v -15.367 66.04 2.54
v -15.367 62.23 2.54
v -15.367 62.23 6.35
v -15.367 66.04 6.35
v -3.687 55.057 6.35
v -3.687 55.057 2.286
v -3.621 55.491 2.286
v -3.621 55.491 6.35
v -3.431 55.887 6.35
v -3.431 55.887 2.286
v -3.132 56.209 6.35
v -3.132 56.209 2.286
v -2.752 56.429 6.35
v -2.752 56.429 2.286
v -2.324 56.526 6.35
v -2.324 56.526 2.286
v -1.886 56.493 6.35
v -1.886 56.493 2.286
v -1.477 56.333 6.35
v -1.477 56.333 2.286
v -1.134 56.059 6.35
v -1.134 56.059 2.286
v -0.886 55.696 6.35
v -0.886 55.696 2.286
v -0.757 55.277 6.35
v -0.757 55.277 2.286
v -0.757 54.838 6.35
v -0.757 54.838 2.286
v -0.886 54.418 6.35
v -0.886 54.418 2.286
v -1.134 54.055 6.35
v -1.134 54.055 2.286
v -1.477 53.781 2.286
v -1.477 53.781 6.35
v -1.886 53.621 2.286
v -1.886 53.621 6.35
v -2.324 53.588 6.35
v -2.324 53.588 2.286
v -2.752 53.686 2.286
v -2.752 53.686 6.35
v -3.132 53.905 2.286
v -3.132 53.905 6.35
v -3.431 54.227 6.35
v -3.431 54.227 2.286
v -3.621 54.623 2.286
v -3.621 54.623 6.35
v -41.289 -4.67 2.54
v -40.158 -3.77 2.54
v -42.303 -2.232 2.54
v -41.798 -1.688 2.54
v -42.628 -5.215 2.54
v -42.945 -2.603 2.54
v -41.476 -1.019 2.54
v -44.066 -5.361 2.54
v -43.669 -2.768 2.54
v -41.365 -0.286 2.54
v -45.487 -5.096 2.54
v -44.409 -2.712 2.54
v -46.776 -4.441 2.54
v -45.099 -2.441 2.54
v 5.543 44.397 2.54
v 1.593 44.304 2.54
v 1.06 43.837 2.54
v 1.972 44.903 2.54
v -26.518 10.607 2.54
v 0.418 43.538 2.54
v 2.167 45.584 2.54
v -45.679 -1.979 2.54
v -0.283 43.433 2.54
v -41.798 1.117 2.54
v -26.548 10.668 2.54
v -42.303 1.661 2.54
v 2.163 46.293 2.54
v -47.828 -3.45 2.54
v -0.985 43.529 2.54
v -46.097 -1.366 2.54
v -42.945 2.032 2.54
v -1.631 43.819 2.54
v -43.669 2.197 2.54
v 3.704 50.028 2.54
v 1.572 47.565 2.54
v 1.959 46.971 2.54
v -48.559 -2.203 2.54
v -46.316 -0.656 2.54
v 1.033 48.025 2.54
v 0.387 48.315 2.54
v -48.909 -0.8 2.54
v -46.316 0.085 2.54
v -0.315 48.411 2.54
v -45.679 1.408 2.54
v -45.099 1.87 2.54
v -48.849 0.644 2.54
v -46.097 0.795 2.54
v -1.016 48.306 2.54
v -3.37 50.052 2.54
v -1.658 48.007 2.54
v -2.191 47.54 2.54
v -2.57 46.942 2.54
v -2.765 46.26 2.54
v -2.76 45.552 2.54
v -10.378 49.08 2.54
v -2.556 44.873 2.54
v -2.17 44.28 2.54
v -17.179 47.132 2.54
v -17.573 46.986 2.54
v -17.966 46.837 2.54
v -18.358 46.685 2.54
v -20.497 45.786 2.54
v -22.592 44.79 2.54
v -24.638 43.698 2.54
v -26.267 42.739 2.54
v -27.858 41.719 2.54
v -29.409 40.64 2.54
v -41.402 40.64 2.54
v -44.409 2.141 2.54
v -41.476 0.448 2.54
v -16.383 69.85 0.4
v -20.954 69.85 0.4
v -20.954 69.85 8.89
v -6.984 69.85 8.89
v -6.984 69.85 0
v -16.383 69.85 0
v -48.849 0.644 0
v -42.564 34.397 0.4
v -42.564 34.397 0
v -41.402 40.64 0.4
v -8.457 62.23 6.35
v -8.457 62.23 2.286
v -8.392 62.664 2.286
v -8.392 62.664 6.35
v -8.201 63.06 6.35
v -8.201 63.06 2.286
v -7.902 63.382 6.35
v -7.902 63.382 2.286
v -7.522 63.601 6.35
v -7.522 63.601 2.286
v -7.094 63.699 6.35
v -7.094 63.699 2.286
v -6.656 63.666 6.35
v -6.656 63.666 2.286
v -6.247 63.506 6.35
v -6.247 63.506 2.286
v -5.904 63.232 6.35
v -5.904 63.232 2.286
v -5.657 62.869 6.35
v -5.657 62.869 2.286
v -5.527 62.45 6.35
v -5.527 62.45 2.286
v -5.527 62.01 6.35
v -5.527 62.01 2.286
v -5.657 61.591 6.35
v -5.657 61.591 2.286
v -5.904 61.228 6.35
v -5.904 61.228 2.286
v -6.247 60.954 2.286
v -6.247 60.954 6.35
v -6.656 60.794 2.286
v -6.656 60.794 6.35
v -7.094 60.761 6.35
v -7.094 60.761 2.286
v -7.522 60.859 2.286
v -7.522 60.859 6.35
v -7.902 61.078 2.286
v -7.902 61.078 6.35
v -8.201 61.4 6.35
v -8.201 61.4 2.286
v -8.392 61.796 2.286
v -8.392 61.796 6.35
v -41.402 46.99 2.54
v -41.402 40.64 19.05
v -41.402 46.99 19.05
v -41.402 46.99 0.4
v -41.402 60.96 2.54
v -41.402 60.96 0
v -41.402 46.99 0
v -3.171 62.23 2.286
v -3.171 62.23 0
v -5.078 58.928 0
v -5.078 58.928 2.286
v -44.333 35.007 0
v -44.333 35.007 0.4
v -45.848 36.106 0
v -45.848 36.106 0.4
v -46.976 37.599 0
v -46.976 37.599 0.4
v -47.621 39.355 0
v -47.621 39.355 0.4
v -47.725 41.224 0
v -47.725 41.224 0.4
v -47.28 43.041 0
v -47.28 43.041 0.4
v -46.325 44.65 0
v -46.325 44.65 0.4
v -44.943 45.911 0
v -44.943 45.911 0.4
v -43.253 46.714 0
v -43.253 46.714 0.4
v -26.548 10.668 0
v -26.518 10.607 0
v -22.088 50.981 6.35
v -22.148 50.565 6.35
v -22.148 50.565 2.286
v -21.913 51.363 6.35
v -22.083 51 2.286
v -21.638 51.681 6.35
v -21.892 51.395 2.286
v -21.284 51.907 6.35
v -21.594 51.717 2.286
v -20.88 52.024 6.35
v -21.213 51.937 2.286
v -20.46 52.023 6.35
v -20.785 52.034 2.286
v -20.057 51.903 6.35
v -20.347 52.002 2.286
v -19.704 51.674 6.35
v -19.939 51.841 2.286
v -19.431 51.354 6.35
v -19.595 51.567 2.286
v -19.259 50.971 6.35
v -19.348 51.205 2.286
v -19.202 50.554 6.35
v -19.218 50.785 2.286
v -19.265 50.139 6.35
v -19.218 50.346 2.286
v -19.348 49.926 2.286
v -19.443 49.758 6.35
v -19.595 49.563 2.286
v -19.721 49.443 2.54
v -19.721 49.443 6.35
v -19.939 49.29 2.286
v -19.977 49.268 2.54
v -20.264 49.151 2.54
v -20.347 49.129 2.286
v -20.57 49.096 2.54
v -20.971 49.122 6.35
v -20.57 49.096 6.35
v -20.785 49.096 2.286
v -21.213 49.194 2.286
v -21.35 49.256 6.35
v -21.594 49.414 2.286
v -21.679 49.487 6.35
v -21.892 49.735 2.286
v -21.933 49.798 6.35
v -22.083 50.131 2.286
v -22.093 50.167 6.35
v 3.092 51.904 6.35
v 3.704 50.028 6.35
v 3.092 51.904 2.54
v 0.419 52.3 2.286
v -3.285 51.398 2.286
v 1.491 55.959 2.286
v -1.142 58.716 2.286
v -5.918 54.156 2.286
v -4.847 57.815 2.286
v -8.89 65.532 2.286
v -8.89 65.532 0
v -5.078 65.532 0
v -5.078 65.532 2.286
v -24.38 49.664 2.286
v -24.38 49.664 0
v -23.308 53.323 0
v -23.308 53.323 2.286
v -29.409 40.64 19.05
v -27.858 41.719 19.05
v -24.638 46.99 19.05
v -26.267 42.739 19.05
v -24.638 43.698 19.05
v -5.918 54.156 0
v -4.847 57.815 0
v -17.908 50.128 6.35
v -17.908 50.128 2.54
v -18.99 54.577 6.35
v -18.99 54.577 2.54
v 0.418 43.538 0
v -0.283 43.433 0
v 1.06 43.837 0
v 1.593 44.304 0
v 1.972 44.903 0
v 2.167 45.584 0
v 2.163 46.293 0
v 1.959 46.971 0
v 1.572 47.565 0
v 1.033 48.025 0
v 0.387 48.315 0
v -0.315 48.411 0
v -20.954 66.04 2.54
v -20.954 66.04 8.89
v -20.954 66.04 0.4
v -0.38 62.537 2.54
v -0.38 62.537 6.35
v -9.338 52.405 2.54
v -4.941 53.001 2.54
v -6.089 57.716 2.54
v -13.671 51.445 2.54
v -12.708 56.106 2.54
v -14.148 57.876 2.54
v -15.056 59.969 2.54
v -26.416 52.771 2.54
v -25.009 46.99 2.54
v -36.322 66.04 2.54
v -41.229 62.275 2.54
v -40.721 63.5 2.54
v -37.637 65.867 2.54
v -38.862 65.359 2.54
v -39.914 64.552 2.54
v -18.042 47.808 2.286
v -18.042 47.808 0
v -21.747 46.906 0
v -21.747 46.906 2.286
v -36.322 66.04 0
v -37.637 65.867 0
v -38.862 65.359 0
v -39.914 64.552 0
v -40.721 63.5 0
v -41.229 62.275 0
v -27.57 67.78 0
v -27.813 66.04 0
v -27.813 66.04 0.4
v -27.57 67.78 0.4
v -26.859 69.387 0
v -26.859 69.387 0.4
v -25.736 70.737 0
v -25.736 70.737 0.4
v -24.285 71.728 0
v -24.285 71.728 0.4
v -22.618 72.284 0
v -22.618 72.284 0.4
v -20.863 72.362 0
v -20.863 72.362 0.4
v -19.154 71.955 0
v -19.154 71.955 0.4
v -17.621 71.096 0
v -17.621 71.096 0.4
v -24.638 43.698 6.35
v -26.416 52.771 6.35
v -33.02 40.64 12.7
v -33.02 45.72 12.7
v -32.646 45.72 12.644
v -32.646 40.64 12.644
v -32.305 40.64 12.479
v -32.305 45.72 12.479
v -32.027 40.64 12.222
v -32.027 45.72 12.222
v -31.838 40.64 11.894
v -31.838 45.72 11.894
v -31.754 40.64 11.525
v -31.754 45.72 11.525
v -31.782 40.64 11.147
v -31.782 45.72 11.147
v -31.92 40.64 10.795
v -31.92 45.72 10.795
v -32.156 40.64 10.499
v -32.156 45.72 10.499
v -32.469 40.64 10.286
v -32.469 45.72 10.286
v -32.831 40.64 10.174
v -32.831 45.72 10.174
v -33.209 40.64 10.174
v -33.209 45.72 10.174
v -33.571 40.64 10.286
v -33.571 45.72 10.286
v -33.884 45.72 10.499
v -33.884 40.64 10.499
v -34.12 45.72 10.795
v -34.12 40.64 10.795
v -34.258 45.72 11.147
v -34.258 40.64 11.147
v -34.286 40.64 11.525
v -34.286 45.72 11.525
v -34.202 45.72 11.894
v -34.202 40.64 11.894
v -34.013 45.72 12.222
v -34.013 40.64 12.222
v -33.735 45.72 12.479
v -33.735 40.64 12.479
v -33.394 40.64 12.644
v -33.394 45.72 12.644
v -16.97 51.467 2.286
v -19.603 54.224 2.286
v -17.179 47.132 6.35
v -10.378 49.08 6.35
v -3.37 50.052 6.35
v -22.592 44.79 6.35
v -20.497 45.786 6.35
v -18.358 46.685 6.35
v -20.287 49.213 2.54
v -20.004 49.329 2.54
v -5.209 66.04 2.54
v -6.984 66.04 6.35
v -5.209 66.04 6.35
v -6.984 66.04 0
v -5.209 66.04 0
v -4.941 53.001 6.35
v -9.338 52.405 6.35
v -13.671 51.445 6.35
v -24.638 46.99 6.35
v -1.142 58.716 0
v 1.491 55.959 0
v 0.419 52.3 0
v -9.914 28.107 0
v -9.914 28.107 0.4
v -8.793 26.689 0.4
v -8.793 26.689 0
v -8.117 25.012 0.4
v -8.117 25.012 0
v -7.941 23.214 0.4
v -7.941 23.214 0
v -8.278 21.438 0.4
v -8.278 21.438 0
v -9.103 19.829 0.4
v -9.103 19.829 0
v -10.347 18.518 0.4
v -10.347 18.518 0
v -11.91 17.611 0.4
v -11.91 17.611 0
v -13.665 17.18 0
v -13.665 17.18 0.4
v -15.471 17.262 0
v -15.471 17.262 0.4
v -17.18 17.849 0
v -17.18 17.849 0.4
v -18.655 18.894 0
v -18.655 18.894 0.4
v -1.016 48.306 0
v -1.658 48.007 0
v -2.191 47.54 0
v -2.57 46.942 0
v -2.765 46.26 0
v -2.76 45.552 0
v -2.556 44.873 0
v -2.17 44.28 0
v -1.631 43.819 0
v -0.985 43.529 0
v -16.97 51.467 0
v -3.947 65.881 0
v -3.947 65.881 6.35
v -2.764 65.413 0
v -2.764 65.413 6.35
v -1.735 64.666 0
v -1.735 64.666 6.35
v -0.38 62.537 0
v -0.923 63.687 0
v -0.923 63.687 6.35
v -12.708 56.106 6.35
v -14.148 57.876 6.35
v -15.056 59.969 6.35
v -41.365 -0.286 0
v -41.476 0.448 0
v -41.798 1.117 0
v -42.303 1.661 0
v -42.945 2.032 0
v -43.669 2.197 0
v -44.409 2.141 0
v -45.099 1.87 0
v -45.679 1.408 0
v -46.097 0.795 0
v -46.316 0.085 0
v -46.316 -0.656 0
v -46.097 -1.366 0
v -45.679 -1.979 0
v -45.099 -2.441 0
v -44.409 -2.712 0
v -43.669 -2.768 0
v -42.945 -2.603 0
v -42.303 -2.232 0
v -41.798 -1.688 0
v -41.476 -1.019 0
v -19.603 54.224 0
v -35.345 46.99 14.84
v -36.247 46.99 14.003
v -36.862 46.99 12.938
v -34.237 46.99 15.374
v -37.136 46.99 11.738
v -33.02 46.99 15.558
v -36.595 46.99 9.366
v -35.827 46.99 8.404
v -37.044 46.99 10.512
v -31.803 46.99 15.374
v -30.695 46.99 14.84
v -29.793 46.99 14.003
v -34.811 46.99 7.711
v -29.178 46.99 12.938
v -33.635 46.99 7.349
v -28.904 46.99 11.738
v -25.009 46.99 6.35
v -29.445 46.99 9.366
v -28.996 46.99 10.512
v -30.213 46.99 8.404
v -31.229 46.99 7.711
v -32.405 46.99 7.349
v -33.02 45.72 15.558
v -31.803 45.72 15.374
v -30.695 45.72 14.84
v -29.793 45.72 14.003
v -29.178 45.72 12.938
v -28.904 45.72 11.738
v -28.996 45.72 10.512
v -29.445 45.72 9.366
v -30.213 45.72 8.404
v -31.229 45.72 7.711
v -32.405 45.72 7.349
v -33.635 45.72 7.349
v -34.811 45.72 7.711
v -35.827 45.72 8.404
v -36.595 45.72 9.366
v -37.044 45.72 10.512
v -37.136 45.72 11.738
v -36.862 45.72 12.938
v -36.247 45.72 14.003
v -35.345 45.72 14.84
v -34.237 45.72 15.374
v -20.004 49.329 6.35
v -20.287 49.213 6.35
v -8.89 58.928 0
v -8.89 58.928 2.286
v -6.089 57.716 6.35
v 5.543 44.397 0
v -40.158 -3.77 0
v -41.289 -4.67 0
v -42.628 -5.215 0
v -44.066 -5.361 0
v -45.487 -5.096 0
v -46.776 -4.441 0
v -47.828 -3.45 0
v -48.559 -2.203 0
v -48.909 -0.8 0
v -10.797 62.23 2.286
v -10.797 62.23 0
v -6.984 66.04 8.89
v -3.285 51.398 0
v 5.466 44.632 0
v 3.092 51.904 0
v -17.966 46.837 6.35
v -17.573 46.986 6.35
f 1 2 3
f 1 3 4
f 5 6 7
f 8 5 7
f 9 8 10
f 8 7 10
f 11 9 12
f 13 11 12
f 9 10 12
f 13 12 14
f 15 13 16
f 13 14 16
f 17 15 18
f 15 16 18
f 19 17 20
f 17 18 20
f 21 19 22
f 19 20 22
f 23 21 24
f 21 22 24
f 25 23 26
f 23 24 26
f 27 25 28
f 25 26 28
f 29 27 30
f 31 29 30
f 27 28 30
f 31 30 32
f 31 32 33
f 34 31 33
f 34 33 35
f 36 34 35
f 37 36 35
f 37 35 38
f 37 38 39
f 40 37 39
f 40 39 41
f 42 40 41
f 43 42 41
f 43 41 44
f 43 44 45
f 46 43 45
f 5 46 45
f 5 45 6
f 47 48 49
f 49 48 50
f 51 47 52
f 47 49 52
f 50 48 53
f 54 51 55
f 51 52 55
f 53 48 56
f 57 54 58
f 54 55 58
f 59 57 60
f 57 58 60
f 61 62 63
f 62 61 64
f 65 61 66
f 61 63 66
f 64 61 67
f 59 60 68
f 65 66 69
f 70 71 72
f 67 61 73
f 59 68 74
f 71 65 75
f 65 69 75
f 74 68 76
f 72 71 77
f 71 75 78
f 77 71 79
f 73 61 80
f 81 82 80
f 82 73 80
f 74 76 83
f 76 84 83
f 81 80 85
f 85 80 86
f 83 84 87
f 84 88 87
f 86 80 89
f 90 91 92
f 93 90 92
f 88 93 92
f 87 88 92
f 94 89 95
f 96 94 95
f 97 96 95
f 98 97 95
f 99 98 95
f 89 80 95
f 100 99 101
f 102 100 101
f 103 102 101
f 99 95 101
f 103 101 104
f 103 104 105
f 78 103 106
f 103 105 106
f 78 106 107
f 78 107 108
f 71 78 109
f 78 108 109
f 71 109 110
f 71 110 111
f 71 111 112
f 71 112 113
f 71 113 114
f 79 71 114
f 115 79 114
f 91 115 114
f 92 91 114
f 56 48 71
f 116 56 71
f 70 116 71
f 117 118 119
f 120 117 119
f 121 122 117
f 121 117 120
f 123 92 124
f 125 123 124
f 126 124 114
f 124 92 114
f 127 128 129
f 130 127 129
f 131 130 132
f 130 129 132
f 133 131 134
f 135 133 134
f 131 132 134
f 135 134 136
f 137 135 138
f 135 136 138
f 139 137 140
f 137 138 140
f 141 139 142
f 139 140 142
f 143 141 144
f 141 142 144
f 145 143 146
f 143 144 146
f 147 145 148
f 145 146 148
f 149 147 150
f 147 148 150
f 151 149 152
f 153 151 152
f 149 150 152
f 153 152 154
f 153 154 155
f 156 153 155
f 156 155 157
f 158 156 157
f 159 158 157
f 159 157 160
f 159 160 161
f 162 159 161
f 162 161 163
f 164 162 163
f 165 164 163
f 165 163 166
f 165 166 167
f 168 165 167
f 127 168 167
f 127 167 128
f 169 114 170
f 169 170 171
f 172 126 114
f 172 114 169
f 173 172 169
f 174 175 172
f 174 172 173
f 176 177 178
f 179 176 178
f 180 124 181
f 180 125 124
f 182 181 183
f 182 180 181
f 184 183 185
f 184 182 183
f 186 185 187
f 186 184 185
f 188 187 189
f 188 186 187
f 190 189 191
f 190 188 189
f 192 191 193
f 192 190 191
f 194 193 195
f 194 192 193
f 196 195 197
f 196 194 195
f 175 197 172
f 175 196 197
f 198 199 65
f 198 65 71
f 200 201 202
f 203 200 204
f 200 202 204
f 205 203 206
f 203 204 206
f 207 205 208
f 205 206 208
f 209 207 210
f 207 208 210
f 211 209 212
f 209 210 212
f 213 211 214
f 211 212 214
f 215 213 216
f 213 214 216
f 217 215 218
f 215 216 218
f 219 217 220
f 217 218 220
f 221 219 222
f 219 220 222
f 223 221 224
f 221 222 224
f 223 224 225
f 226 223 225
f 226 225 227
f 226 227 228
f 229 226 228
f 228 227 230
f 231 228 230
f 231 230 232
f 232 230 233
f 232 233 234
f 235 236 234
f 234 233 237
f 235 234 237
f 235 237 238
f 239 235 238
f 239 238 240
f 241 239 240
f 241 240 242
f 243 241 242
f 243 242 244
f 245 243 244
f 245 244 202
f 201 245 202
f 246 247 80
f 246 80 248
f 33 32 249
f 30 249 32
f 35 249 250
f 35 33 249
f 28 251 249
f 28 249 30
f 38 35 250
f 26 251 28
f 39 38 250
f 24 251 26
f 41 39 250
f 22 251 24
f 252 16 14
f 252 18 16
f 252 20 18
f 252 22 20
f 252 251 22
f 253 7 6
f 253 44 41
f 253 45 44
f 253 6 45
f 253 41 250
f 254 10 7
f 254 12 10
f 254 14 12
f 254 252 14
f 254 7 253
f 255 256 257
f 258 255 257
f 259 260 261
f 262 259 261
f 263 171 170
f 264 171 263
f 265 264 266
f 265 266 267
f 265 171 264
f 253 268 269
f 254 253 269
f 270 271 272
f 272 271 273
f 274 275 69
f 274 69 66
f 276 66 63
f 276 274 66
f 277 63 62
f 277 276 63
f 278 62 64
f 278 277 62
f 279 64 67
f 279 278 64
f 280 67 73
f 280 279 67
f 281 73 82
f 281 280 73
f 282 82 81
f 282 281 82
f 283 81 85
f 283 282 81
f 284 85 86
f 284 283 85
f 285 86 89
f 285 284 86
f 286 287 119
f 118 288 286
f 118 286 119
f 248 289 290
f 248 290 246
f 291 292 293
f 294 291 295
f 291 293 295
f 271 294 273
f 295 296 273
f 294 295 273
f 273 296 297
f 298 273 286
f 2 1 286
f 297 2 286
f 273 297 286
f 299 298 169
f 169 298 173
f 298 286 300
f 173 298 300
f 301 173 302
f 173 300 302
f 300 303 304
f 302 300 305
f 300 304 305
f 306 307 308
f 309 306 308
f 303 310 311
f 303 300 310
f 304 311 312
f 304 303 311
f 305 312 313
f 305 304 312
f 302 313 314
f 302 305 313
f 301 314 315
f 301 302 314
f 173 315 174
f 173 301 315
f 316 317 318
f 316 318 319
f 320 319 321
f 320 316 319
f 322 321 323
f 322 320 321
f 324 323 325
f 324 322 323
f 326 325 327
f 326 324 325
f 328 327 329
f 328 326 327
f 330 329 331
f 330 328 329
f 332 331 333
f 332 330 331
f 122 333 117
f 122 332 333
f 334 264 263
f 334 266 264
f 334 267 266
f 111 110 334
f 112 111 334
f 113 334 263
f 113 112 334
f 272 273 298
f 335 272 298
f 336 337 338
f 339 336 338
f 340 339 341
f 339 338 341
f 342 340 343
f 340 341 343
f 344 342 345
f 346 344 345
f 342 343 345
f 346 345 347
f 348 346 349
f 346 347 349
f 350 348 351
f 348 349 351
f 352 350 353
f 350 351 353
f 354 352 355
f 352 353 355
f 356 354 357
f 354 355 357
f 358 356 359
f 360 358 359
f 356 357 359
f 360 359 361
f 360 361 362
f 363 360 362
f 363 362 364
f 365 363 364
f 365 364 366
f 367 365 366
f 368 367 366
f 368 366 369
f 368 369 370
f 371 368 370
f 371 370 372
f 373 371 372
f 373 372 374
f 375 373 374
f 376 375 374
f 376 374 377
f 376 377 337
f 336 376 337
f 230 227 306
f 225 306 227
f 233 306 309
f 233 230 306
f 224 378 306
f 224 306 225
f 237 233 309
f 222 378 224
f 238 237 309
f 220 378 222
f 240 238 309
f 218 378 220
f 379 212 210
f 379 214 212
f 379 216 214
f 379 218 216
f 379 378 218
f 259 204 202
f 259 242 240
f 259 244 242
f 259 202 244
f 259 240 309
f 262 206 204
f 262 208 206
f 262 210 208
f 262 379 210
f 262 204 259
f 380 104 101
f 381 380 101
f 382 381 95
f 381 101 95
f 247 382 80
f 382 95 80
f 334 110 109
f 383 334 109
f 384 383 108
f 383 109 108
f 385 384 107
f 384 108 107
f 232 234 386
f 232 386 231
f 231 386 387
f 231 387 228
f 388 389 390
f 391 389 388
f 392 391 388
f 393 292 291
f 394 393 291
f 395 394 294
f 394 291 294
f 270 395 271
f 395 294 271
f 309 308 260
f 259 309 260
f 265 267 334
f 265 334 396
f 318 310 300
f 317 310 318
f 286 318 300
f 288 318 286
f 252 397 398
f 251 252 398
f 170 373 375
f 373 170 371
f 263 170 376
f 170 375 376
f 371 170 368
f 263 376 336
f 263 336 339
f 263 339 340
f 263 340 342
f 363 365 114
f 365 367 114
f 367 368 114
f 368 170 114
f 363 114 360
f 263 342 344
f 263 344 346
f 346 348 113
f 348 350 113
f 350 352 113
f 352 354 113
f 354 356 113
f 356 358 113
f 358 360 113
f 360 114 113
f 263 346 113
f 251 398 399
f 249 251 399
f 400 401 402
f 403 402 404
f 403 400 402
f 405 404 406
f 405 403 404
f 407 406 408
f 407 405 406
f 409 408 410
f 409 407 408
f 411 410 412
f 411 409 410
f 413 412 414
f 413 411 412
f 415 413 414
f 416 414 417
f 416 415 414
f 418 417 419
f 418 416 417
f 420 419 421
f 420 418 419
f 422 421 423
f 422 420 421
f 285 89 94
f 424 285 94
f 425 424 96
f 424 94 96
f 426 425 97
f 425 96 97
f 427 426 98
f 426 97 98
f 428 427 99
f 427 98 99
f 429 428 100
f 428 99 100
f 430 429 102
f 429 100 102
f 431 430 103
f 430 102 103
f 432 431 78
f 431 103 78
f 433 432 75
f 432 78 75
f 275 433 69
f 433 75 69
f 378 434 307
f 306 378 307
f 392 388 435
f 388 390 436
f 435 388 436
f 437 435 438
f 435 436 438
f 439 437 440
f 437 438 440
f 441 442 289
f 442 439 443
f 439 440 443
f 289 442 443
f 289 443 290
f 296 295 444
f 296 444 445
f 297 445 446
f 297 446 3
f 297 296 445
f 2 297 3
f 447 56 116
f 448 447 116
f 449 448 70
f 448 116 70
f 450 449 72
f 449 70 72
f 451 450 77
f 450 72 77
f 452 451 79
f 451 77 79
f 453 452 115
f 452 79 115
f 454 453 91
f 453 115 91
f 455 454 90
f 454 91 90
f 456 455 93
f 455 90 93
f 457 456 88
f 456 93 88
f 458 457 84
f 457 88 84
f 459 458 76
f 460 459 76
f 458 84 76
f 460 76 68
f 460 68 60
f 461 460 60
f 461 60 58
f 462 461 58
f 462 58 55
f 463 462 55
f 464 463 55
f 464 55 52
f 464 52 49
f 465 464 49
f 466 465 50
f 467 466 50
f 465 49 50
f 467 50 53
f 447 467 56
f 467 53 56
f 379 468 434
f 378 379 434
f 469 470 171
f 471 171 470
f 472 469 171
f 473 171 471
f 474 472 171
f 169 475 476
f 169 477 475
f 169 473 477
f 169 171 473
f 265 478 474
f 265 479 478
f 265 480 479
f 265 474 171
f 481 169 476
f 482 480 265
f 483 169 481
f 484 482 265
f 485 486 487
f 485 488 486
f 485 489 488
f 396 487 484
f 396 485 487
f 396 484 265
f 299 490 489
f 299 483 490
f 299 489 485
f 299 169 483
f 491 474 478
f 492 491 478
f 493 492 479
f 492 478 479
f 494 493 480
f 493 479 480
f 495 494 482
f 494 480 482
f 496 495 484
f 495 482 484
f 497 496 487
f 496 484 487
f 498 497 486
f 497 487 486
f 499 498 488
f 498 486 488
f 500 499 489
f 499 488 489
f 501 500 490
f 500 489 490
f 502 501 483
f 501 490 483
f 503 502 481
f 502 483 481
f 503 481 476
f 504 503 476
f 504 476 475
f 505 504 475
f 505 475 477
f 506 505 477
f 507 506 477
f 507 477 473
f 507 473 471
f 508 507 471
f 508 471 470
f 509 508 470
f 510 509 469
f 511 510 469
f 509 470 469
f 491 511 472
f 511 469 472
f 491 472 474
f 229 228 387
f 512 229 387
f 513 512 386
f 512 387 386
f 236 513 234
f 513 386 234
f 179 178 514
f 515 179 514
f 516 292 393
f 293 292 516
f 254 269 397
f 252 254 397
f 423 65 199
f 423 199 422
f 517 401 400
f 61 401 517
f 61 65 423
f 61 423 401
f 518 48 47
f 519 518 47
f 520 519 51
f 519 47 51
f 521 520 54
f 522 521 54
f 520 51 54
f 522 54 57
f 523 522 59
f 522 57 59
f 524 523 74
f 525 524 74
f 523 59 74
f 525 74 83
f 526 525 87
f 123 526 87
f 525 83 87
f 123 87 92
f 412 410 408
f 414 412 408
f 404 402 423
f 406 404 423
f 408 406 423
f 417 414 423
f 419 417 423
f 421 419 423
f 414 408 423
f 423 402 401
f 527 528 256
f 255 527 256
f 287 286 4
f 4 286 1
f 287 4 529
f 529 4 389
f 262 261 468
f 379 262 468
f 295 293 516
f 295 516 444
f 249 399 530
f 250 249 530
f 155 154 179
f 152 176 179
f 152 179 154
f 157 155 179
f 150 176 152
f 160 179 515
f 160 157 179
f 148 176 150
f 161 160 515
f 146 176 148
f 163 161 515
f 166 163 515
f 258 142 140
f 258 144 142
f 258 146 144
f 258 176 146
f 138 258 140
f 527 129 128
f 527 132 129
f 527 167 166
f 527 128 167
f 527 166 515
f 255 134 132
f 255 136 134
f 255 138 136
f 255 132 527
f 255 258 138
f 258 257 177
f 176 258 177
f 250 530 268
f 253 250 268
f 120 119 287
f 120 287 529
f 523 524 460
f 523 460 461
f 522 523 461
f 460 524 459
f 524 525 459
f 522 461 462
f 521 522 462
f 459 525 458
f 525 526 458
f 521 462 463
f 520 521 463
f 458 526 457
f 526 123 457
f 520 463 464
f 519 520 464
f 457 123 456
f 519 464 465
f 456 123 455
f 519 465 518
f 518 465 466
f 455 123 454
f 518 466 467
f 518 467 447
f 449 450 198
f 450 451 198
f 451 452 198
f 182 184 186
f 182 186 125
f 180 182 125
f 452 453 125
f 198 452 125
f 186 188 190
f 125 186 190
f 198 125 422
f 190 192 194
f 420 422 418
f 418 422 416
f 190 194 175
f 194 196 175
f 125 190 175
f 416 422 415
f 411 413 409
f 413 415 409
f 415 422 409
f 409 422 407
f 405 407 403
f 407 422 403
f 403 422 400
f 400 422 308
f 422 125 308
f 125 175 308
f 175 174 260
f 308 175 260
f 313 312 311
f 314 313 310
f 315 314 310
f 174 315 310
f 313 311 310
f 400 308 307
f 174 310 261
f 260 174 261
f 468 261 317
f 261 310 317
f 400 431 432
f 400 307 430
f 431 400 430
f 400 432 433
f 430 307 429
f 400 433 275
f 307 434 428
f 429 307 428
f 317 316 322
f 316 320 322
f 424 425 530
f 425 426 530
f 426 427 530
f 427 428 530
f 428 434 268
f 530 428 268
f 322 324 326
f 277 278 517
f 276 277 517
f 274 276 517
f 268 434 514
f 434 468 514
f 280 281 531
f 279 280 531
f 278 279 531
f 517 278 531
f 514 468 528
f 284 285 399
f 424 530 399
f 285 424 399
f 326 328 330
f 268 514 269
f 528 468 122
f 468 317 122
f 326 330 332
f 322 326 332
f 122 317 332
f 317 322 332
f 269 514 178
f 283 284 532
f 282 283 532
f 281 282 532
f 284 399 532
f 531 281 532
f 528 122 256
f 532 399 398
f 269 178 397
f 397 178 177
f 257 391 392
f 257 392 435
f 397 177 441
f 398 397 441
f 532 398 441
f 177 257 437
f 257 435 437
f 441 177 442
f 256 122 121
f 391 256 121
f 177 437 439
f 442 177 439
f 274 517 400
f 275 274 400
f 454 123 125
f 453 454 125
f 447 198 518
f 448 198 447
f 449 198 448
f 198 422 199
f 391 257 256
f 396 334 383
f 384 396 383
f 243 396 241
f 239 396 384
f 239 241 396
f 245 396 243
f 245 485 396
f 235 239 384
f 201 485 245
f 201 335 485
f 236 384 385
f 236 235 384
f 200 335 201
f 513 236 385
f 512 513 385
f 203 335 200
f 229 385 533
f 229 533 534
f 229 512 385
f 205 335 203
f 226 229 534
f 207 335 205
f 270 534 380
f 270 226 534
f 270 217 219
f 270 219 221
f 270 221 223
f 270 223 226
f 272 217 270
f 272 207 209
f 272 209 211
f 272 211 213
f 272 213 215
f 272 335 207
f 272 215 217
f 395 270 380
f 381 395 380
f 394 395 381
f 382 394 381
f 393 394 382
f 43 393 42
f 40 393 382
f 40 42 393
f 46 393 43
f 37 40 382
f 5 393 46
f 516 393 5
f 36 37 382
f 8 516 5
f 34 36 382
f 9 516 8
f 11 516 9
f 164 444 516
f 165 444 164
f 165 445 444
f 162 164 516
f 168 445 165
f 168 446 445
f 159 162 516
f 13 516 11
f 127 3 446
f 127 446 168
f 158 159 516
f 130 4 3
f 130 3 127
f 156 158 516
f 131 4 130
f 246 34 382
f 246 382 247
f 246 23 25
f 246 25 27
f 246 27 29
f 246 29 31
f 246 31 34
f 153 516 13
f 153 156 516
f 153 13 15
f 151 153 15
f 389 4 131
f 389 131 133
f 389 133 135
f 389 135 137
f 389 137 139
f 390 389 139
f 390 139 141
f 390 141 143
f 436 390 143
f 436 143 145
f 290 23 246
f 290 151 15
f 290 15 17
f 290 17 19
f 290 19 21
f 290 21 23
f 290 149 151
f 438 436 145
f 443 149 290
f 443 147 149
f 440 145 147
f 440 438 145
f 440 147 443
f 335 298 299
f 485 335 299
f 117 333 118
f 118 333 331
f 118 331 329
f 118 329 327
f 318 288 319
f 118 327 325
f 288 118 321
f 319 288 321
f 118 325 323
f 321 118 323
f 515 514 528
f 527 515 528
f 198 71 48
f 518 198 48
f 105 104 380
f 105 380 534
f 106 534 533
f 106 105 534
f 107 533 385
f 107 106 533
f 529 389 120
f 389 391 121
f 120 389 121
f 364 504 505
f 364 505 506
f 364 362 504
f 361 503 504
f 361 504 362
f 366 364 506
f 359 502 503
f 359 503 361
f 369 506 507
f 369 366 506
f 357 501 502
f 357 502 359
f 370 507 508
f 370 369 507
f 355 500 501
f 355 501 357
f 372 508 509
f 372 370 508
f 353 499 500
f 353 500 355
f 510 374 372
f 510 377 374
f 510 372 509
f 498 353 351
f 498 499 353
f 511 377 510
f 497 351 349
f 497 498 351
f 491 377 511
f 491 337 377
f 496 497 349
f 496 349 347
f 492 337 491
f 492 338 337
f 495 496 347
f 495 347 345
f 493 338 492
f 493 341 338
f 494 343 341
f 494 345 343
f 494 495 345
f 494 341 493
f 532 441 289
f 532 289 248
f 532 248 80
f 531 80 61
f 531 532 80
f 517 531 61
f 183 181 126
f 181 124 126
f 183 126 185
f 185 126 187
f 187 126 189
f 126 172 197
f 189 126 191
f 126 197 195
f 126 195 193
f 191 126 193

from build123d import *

# Parameters (mm, degrees)
SKETCH2_R                = 3.81
BOSS_EXTRUDE1_DEPTH      = 2.54
SKETCH5_W                = 16.764
SKETCH5_H                = 6.35
BOSS_EXTRUDE2_DEPTH      = 16.51
SKETCH6_R                = 4.1275
CUT_EXTRUDE2_DEPTH       = 1.27
SKETCH7_R                = 1.27
CUT_EXTRUDE3_DEPTH       = 80.197102245
CUT_EXTRUDE4_DEPTH       = 2.286
BOSS_EXTRUDE3_DEPTH      = 3.81
F_4_CLEARANCE_HOLE1_D    = 2.9464
BOSS_EXTRUDE6_DEPTH      = 6.35
BOSS_EXTRUDE6_DEPTH_BACK = 2.54
SKETCH14_W               = 13.97
SKETCH14_H               = 3.81
FILLET1_R                = 5.08
CUT_EXTRUDE5_DEPTH       = 83.859689862
CUT_EXTRUDE5_DEPTH_BACK  = 83.859689862
SKETCH19_R               = 2.4892
BOSS_EXTRUDE8_DEPTH      = 2.54
CUT_EXTRUDE8_DEPTH       = 2.54
BOSS_EXTRUDE7_DEPTH      = 3.81
CUT_EXTRUDE7_DEPTH       = 87.868867767
SKETCH13_R               = 6.35
PRINT_TABS_DEPTH         = 0.4


# Read off the part's stored shape, not the designer's step: Boss-Extrude7
with BuildPart() as part:
    # Sketch2 → Boss-Extrude1 (new body)
    with BuildSketch(Plane.XY):
        with BuildLine():
            Line((-17.068825413, -8.459178389), (-41.402, 40.64))
            Line((-41.402, 40.64), (-41.402, 66.04))
            Line((-41.402, 66.04), (-1.524, 66.04))
            Line((-1.524, 66.04), (18.109053667, 5.913093546))
            ThreePointArc((18.109053667, 5.913093546), (7.204933647, -17.634949139), (-17.068825413, -8.459178389))
        make_face()
        Circle(SKETCH2_R, mode=Mode.SUBTRACT)
    extrude(amount=BOSS_EXTRUDE1_DEPTH)

    # Sketch5 → Boss-Extrude2 (add)
    with BuildSketch(Plane.XY.offset(2.54)):
        with Locations((-33.02, 43.815)):
            Rectangle(SKETCH5_W, SKETCH5_H)
    extrude(amount=BOSS_EXTRUDE2_DEPTH)

    # Sketch6 → Cut-Extrude2 (cut)
    with BuildSketch(Plane(origin=(0, 46.99, 0), x_dir=(1, 0, 0), z_dir=(0, 1, 0))):
        with Locations(Location((-33.02, -11.43, 0), (0, 0, 270))):
            Circle(SKETCH6_R)
    extrude(amount=-CUT_EXTRUDE2_DEPTH, mode=Mode.SUBTRACT)

    # Sketch7 → Cut-Extrude3 (cut, through all)
    with BuildSketch(Plane(origin=(0, 45.72, 0), x_dir=(1, 0, 0), z_dir=(0, 1, 0))):
        with Locations(Location((-33.02, -11.43, 0), (0, 0, 270))):
            Circle(SKETCH7_R)
    extrude(amount=-CUT_EXTRUDE3_DEPTH, mode=Mode.SUBTRACT)

    # Sketch9 → Cut-Extrude4 (cut)
    with BuildSketch(Plane(origin=(0, 0, 0), x_dir=(-1, 0, 0), z_dir=(0, 0, -1))):
        Polygon((3.171122265, 62.23), (5.077532854, 58.928), (8.890354032, 58.928), (10.796764621, 62.23), (8.890354032, 65.532), (5.077532854, 65.532), align=None)
        Polygon((24.379877895, 49.663956202), (23.308143816, 53.323053276), (19.603405755, 54.224452874), (16.970401774, 51.466755398), (18.042135853, 47.807658324), (21.746873914, 46.906258726), align=None)
        Polygon((5.918476139, 54.15579827), (4.846742059, 57.814895344), (1.142003999, 58.716294942), (-1.490999983, 55.958597466), (-0.419265903, 52.299500392), (3.285472157, 51.398100794), align=None)
    extrude(amount=-CUT_EXTRUDE4_DEPTH, mode=Mode.SUBTRACT)

    # Sketch8 → Boss-Extrude3 (add)
    with BuildSketch(Plane.XY.offset(2.54)):
        with BuildLine():
            Line((-15.367, 66.04), (-6.983943443, 66.04))
            Line((-6.983943443, 66.04), (-1.524, 66.04))
            Line((-1.524, 66.04), (3.09175139, 51.904101595))
            Line((3.09175139, 51.904101595), (-4.240438106, 50.120107003))
            Line((-4.240438106, 50.120107003), (-6.088713216, 57.716488409))
            Line((-6.088713216, 57.716488409), (-12.708473154, 56.10583501))
            ThreePointArc((-12.708473154, 56.10583501), (-14.673699407, 58.891843255), (-15.367, 62.23))
            Line((-15.367, 62.23), (-15.367, 66.04))
        make_face()
        Polygon((-17.142042414, 46.981018422), (-18.990317524, 54.577399829), (-26.415687706, 52.770733449), (-24.567412596, 45.174352043), align=None)
    extrude(amount=BOSS_EXTRUDE3_DEPTH)

    # #4 Clearance Hole1 (through all)
    with Locations(Plane.XY.offset(6.35)):
        with Locations((-6.983943443, 62.23), (-20.675139834, 50.5653558), (-2.213738078, 55.057197868)):
            Hole(F_4_CLEARANCE_HOLE1_D / 2)

    # Sketch14 → Boss-Extrude6 (add, two sides: drawn at the far end of the back side and taken through both)
    with BuildSketch(Plane.XY.offset(2.54).offset(-BOSS_EXTRUDE6_DEPTH_BACK)):
        with Locations((-13.968943443, 67.945)):
            Rectangle(SKETCH14_W, SKETCH14_H)
    extrude(amount=BOSS_EXTRUDE6_DEPTH + BOSS_EXTRUDE6_DEPTH_BACK)

    # Fillet1
    fillet1_edges = [part.edges().sort_by_distance(p)[0] for p in [
        (-41.402, 66.04, 1.27),
        (-1.524, 66.04, 3.175),
    ]]
    fillet(fillet1_edges, radius=FILLET1_R)

    # Sketch15 → Cut-Extrude5 (cut, two sides: drawn at the far end of the back side and taken through both)
    with BuildSketch(Plane.XY.offset(2.54).offset(-CUT_EXTRUDE5_DEPTH_BACK)):
        with BuildLine():
            ThreePointArc((-0.315167053, 48.411374113), (-18.310138041, 44.816284079), (-33.674369734, 34.782140486))
            ThreePointArc((-33.674369734, 34.782140486), (-33.731327517, 31.262340905), (-30.211527936, 31.205383122))
            ThreePointArc((-30.211527936, 31.205383122), (-16.427248714, 40.207684038), (-0.28275743, 43.433079608))
            ThreePointArc((-0.28275743, 43.433079608), (2.190185011, 45.938431672), (-0.315167053, 48.411374113))
        make_face()
    extrude(amount=CUT_EXTRUDE5_DEPTH + CUT_EXTRUDE5_DEPTH_BACK, mode=Mode.SUBTRACT)

    # Sketch19 → Boss-Extrude8 (add, through all)
    with BuildSketch(Plane.XY.offset(2.54)):
        with BuildLine():
            Line((5.466200245, 44.632269783), (-40.158007355, -3.769954845))
            ThreePointArc((-40.158007355, -3.769954845), (-46.15516131, -4.814733016), (-48.848797168, 0.64436424))
            Line((-48.848797168, 0.64436424), (-41.402, 40.64))
            Line((-41.402, 40.64), (3.09175139, 51.904101595))
            Line((3.09175139, 51.904101595), (5.466200245, 44.632269783))
        make_face()
        with Locations((-0.298962241, 45.92222686)):
            Circle(SKETCH19_R, mode=Mode.SUBTRACT)
        with Locations((-43.854625645, -0.285501773)):
            Circle(SKETCH19_R, mode=Mode.SUBTRACT)
    extrude(amount=-BOSS_EXTRUDE8_DEPTH)

    # Sketch20 → Cut-Extrude8 (cut)
    with BuildSketch(Plane.XY.offset(2.54)):
        Polygon((-40.158007355, -3.769954845), (10.729493517, 49.863783044), (48.07174347, 14.433588323), (-7.673080914, -44.319607422), align=None)
    extrude(amount=-CUT_EXTRUDE8_DEPTH, mode=Mode.SUBTRACT)

    # Boss-Extrude7 outline → Boss-Extrude7 (add)
    with BuildSketch(Plane.XY.offset(2.54)):
        with BuildLine():
            ThreePointArc((-19.720952416, 49.442927803), (-20.146011494, 49.271262362), (-20.56957647, 49.095942783))
            ThreePointArc((-20.56957647, 49.095942783), (-20.117584831, 49.201739043), (-19.720952416, 49.442927803))
        make_face()
        with BuildLine():
            ThreePointArc((-24.638, 43.697782335), (-21.550057665, 45.300355844), (-18.358466971, 46.685050235))
            Line((-18.358466971, 46.685050235), (-24.567412596, 45.174352043))
            Line((-24.567412596, 45.174352043), (-24.638, 45.464465155))
            Line((-24.638, 45.464465155), (-24.638, 43.697782335))
        make_face()
        with BuildLine():
            ThreePointArc((-4.941378488, 53.000960864), (-11.514519488, 51.97051967), (-17.907769463, 50.128144457))
            Line((-17.907769463, 50.128144457), (-17.178757335, 47.131916166))
            ThreePointArc((-17.178757335, 47.131916166), (-6.891074176, 49.689438734), (3.704334892, 50.028043416))
            Line((3.704334892, 50.028043416), (3.09175139, 51.904101595))
            Line((3.09175139, 51.904101595), (-4.240438106, 50.120107003))
            Line((-4.240438106, 50.120107003), (-4.941378488, 53.000960864))
        make_face()
    extrude(amount=BOSS_EXTRUDE7_DEPTH)

    # Sketch16 → Cut-Extrude7 (cut, through all)
    with BuildSketch(Plane.XY.offset(2.54)):
        with BuildLine():
            ThreePointArc((-0.326576563, 50.163936974), (-18.972991936, 46.4386994), (-34.893431388, 36.041305068))
            ThreePointArc((-34.893431388, 36.041305068), (-34.990492099, 30.043279251), (-28.992466282, 29.94621854))
            ThreePointArc((-28.992466282, 29.94621854), (-15.764394819, 38.585268717), (-0.271347919, 41.680516747))
            ThreePointArc((-0.271347919, 41.680516747), (3.942747872, 45.949841182), (-0.326576563, 50.163936974))
        make_face()
    extrude(amount=CUT_EXTRUDE7_DEPTH, mode=Mode.SUBTRACT)

    # Sketch13 → Print Tabs (add)
    with BuildSketch(Plane(origin=(0, 0, 0), x_dir=(-1, 0, 0), z_dir=(0, 0, -1))):
        with Locations((14.284313144, 23.500060577)):
            Circle(SKETCH13_R)
        with Locations((21.463, 66.04)):
            Circle(SKETCH13_R)
        with Locations((41.402, 40.64)):
            Circle(SKETCH13_R)
    extrude(amount=-PRINT_TABS_DEPTH)


solid = part.part
